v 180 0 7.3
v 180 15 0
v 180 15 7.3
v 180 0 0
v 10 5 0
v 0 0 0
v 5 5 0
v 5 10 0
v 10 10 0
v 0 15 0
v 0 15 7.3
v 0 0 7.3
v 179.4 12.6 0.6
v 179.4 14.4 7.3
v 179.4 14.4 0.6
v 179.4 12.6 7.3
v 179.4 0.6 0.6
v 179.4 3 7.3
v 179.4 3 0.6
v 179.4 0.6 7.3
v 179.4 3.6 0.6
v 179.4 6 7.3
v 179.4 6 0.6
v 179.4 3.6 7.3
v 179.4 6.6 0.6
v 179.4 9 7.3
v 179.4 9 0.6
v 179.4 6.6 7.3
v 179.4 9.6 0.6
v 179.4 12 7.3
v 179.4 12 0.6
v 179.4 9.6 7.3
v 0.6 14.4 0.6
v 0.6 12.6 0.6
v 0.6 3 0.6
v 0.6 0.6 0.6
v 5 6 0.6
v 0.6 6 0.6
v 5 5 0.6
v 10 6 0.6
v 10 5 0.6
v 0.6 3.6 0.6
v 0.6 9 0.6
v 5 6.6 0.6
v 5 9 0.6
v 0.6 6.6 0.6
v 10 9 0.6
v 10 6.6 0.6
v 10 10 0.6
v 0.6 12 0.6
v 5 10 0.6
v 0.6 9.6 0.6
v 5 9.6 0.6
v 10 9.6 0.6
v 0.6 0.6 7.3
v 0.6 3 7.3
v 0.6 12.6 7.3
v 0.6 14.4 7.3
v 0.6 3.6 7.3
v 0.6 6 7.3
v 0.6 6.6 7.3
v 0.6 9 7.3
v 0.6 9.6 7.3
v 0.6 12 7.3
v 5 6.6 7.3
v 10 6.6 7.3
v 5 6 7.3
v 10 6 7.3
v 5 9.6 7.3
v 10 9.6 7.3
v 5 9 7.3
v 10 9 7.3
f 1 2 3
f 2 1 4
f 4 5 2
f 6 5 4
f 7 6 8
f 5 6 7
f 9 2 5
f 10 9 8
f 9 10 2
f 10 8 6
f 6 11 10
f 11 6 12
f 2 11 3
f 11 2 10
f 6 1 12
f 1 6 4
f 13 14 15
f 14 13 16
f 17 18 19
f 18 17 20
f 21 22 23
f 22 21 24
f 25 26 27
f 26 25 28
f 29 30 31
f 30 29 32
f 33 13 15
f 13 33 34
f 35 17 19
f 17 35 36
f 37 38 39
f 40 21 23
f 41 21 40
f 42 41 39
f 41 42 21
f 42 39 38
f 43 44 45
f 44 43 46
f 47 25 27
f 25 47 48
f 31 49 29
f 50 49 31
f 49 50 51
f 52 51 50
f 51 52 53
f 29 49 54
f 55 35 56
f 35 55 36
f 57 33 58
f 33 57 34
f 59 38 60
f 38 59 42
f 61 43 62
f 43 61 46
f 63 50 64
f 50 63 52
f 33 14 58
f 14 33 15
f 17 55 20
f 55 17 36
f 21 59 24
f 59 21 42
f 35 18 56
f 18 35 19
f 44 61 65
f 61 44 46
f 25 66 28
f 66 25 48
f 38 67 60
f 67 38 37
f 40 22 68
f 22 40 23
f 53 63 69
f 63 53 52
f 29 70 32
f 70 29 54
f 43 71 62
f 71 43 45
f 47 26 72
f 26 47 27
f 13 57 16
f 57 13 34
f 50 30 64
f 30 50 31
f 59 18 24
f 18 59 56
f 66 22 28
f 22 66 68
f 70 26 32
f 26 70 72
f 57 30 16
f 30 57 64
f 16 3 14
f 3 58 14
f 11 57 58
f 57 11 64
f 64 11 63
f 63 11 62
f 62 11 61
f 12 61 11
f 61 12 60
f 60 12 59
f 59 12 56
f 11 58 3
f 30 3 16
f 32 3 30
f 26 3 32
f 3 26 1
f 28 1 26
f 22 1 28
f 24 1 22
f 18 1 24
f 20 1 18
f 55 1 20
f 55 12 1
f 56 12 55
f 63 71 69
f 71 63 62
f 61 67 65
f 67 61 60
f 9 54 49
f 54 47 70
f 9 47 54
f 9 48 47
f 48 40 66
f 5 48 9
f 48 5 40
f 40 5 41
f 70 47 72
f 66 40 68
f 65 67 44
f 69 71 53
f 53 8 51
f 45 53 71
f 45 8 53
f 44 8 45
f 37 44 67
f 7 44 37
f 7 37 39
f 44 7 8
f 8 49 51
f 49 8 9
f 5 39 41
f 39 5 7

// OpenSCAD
t=0.6;
n=5;

difference(){

	union(){ 
		difference(){
			cube([180,15,8]);
			
			translate([t,t,t])
			cube([180-2*t,15-2*t, 8-2*t]);
		}
		
		for(i=[0:15/n:15-1]){
			translate([0,i,0])
			cube([180,t,8]);
		}
	}

	translate([-t,-t,8-t-0.1])
	cube([180+2*t,15+2*t,8+2*t]);

	translate([5,5,-1])
	cube([5,5,16]);

}
